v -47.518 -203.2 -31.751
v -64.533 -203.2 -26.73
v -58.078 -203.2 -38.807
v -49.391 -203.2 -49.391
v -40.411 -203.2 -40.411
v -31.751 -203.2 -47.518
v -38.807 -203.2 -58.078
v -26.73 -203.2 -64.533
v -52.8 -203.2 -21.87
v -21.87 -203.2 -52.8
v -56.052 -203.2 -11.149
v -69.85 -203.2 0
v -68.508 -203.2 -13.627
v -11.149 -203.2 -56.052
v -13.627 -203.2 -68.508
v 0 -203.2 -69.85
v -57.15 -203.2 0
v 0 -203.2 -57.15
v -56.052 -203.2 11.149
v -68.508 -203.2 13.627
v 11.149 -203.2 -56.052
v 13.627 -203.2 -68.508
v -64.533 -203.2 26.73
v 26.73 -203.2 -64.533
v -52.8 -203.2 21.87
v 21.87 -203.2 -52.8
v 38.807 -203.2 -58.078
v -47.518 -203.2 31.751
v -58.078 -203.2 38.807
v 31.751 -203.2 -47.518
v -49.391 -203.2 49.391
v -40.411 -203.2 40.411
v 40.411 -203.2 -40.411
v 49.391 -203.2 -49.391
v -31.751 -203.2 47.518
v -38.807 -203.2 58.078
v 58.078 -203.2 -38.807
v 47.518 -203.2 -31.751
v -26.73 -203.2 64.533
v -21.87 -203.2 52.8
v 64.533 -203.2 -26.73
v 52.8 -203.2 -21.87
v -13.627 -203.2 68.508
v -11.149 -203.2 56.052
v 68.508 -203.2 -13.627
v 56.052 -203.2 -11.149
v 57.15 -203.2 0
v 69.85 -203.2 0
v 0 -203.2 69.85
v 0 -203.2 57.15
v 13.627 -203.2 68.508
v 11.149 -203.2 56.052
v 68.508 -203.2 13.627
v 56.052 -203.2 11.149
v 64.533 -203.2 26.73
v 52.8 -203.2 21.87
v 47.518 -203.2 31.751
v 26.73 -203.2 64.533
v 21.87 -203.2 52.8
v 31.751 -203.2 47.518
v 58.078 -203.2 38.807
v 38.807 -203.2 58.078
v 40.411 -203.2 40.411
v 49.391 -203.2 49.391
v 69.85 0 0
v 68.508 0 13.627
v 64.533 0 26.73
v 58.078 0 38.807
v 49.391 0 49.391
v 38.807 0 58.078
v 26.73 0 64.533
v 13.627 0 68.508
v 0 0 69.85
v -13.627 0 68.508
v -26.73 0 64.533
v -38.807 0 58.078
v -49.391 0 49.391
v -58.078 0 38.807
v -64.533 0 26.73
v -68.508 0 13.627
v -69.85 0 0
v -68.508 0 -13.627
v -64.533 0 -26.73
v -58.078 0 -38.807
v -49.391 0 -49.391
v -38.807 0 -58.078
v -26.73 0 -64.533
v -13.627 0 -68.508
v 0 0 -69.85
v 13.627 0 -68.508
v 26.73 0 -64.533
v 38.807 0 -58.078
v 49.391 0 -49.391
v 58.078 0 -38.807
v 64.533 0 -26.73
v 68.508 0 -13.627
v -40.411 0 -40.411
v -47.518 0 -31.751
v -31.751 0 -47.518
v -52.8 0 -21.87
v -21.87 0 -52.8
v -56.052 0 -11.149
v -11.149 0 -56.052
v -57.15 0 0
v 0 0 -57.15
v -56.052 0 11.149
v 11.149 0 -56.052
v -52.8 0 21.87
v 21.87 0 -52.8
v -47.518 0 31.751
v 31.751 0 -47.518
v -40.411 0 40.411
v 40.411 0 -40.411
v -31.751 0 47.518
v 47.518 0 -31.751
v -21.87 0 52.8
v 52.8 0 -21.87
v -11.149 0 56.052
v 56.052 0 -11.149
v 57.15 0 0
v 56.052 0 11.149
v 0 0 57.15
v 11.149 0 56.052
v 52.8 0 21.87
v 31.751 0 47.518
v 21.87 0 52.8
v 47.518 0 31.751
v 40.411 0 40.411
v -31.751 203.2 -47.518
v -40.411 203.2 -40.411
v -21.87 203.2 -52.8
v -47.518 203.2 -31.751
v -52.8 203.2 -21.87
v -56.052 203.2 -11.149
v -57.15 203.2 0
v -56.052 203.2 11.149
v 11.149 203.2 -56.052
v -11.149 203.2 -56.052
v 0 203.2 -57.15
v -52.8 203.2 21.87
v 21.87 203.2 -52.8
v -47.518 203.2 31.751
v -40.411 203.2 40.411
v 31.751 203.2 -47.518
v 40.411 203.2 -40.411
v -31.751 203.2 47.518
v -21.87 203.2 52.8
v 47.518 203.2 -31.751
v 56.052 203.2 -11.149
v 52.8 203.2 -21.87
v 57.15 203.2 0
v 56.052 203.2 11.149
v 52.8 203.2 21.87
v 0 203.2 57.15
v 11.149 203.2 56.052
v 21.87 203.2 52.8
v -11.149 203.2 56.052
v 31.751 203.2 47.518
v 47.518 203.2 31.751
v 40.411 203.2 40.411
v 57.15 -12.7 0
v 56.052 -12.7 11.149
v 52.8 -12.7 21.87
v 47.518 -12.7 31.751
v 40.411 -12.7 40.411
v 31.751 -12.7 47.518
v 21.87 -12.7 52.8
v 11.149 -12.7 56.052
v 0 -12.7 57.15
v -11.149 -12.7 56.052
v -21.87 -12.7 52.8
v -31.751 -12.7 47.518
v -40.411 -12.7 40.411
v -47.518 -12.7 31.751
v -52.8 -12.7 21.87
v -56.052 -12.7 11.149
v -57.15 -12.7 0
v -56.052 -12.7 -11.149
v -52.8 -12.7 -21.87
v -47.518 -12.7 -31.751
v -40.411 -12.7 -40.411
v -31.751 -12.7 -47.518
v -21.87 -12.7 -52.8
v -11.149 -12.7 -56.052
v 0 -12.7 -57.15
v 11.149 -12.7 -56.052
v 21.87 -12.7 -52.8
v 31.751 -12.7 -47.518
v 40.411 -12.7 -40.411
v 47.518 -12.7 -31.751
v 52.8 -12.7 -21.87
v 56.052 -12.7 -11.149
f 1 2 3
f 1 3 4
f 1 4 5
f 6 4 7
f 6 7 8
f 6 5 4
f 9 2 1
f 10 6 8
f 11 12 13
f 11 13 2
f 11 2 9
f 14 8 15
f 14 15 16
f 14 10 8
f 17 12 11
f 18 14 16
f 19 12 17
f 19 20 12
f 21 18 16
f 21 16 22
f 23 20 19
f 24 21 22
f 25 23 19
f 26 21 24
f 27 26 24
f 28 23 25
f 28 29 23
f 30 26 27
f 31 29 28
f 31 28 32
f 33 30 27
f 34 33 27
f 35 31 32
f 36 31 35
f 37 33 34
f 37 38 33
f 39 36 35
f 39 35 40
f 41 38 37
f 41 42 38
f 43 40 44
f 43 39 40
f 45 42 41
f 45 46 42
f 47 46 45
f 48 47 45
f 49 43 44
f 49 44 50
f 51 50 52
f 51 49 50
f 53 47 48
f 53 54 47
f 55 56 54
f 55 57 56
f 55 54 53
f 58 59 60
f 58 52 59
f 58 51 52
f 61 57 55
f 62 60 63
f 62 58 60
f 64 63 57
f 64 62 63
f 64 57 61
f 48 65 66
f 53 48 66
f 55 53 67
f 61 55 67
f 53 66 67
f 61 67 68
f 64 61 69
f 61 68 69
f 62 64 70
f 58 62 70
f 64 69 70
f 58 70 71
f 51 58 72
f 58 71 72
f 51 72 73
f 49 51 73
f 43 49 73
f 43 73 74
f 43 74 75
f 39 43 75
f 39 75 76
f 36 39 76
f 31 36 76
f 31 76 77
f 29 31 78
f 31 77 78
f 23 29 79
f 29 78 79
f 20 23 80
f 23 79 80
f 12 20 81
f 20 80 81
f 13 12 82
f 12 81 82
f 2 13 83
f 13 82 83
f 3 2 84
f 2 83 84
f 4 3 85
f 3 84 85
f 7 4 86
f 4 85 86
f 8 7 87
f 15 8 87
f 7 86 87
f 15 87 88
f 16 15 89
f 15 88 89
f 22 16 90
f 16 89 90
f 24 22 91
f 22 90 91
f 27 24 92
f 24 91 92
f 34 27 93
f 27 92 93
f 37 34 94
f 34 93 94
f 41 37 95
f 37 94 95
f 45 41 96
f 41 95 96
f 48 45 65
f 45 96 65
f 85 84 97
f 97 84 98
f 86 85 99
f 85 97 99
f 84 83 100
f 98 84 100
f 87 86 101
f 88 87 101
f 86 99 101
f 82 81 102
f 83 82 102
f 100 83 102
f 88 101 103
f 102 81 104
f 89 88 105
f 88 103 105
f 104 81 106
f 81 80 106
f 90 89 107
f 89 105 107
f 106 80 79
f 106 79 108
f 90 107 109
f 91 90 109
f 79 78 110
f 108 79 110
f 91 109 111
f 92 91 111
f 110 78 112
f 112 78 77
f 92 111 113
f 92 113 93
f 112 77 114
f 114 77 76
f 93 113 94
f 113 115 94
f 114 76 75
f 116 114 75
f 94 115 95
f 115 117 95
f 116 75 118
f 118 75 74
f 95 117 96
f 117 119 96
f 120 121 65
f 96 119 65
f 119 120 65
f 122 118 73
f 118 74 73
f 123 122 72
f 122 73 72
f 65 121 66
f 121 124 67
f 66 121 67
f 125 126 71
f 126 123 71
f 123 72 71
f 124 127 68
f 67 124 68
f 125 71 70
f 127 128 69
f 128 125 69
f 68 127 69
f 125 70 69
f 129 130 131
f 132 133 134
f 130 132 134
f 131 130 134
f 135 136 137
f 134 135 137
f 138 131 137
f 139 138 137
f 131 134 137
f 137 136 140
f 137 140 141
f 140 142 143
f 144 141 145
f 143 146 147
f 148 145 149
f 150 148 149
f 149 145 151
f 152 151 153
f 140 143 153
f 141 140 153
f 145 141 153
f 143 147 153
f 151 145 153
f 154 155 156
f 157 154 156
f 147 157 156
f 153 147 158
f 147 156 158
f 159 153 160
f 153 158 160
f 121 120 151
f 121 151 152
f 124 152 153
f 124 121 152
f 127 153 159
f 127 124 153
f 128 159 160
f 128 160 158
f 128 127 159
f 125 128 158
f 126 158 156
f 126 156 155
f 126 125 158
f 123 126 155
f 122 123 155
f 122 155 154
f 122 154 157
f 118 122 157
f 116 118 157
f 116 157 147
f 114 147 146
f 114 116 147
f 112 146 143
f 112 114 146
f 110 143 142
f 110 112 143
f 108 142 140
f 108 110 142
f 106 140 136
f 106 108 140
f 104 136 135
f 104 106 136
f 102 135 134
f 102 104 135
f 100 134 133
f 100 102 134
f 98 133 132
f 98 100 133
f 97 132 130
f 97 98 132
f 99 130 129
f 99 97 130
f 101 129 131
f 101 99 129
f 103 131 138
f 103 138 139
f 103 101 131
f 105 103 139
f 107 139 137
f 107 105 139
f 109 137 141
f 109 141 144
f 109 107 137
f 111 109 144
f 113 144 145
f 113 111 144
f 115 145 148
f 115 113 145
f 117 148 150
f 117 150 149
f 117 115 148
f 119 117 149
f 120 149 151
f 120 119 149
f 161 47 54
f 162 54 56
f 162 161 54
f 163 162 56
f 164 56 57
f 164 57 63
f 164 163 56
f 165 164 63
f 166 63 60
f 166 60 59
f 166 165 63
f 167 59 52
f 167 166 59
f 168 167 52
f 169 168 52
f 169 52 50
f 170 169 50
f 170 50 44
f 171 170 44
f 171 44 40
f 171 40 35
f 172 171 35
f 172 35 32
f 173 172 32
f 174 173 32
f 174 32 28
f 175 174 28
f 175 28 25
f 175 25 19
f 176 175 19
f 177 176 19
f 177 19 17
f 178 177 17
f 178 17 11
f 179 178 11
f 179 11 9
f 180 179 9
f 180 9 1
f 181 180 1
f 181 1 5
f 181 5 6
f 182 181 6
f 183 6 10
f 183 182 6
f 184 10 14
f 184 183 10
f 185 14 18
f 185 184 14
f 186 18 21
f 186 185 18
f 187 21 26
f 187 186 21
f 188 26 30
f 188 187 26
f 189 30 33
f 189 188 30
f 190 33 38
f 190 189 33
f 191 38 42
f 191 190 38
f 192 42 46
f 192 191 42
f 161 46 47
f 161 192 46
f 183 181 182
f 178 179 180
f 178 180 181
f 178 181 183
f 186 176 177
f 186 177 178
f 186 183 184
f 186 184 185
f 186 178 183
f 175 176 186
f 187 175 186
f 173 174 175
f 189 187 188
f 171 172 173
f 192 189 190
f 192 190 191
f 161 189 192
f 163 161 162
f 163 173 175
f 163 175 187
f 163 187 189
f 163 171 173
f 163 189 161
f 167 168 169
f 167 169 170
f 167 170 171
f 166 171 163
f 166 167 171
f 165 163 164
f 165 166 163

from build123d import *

# Parameters (mm, degrees)
F0_R     = 69.85
F0_R_2   = 57.15
F1_DEPTH = 203.2
F2_R     = 57.15
F3_DEPTH = 12.7
F4_DEPTH = 203.2


with BuildPart() as f1:
    # F0 (on Front) → F1 (new body)
    with BuildSketch(Plane.XZ):
        Circle(F0_R)
        Circle(F0_R_2, mode=Mode.SUBTRACT)
    extrude(amount=F1_DEPTH)

    # F2 (on Front) → F3 (join)
    with BuildSketch(Plane.XZ):
        Circle(F2_R)
    extrude(amount=F3_DEPTH)

    # F2 (on Front) → F4 (join)
    with BuildSketch(Plane.XZ):
        Circle(F2_R)
    extrude(amount=-F4_DEPTH)


solid = f1.part
